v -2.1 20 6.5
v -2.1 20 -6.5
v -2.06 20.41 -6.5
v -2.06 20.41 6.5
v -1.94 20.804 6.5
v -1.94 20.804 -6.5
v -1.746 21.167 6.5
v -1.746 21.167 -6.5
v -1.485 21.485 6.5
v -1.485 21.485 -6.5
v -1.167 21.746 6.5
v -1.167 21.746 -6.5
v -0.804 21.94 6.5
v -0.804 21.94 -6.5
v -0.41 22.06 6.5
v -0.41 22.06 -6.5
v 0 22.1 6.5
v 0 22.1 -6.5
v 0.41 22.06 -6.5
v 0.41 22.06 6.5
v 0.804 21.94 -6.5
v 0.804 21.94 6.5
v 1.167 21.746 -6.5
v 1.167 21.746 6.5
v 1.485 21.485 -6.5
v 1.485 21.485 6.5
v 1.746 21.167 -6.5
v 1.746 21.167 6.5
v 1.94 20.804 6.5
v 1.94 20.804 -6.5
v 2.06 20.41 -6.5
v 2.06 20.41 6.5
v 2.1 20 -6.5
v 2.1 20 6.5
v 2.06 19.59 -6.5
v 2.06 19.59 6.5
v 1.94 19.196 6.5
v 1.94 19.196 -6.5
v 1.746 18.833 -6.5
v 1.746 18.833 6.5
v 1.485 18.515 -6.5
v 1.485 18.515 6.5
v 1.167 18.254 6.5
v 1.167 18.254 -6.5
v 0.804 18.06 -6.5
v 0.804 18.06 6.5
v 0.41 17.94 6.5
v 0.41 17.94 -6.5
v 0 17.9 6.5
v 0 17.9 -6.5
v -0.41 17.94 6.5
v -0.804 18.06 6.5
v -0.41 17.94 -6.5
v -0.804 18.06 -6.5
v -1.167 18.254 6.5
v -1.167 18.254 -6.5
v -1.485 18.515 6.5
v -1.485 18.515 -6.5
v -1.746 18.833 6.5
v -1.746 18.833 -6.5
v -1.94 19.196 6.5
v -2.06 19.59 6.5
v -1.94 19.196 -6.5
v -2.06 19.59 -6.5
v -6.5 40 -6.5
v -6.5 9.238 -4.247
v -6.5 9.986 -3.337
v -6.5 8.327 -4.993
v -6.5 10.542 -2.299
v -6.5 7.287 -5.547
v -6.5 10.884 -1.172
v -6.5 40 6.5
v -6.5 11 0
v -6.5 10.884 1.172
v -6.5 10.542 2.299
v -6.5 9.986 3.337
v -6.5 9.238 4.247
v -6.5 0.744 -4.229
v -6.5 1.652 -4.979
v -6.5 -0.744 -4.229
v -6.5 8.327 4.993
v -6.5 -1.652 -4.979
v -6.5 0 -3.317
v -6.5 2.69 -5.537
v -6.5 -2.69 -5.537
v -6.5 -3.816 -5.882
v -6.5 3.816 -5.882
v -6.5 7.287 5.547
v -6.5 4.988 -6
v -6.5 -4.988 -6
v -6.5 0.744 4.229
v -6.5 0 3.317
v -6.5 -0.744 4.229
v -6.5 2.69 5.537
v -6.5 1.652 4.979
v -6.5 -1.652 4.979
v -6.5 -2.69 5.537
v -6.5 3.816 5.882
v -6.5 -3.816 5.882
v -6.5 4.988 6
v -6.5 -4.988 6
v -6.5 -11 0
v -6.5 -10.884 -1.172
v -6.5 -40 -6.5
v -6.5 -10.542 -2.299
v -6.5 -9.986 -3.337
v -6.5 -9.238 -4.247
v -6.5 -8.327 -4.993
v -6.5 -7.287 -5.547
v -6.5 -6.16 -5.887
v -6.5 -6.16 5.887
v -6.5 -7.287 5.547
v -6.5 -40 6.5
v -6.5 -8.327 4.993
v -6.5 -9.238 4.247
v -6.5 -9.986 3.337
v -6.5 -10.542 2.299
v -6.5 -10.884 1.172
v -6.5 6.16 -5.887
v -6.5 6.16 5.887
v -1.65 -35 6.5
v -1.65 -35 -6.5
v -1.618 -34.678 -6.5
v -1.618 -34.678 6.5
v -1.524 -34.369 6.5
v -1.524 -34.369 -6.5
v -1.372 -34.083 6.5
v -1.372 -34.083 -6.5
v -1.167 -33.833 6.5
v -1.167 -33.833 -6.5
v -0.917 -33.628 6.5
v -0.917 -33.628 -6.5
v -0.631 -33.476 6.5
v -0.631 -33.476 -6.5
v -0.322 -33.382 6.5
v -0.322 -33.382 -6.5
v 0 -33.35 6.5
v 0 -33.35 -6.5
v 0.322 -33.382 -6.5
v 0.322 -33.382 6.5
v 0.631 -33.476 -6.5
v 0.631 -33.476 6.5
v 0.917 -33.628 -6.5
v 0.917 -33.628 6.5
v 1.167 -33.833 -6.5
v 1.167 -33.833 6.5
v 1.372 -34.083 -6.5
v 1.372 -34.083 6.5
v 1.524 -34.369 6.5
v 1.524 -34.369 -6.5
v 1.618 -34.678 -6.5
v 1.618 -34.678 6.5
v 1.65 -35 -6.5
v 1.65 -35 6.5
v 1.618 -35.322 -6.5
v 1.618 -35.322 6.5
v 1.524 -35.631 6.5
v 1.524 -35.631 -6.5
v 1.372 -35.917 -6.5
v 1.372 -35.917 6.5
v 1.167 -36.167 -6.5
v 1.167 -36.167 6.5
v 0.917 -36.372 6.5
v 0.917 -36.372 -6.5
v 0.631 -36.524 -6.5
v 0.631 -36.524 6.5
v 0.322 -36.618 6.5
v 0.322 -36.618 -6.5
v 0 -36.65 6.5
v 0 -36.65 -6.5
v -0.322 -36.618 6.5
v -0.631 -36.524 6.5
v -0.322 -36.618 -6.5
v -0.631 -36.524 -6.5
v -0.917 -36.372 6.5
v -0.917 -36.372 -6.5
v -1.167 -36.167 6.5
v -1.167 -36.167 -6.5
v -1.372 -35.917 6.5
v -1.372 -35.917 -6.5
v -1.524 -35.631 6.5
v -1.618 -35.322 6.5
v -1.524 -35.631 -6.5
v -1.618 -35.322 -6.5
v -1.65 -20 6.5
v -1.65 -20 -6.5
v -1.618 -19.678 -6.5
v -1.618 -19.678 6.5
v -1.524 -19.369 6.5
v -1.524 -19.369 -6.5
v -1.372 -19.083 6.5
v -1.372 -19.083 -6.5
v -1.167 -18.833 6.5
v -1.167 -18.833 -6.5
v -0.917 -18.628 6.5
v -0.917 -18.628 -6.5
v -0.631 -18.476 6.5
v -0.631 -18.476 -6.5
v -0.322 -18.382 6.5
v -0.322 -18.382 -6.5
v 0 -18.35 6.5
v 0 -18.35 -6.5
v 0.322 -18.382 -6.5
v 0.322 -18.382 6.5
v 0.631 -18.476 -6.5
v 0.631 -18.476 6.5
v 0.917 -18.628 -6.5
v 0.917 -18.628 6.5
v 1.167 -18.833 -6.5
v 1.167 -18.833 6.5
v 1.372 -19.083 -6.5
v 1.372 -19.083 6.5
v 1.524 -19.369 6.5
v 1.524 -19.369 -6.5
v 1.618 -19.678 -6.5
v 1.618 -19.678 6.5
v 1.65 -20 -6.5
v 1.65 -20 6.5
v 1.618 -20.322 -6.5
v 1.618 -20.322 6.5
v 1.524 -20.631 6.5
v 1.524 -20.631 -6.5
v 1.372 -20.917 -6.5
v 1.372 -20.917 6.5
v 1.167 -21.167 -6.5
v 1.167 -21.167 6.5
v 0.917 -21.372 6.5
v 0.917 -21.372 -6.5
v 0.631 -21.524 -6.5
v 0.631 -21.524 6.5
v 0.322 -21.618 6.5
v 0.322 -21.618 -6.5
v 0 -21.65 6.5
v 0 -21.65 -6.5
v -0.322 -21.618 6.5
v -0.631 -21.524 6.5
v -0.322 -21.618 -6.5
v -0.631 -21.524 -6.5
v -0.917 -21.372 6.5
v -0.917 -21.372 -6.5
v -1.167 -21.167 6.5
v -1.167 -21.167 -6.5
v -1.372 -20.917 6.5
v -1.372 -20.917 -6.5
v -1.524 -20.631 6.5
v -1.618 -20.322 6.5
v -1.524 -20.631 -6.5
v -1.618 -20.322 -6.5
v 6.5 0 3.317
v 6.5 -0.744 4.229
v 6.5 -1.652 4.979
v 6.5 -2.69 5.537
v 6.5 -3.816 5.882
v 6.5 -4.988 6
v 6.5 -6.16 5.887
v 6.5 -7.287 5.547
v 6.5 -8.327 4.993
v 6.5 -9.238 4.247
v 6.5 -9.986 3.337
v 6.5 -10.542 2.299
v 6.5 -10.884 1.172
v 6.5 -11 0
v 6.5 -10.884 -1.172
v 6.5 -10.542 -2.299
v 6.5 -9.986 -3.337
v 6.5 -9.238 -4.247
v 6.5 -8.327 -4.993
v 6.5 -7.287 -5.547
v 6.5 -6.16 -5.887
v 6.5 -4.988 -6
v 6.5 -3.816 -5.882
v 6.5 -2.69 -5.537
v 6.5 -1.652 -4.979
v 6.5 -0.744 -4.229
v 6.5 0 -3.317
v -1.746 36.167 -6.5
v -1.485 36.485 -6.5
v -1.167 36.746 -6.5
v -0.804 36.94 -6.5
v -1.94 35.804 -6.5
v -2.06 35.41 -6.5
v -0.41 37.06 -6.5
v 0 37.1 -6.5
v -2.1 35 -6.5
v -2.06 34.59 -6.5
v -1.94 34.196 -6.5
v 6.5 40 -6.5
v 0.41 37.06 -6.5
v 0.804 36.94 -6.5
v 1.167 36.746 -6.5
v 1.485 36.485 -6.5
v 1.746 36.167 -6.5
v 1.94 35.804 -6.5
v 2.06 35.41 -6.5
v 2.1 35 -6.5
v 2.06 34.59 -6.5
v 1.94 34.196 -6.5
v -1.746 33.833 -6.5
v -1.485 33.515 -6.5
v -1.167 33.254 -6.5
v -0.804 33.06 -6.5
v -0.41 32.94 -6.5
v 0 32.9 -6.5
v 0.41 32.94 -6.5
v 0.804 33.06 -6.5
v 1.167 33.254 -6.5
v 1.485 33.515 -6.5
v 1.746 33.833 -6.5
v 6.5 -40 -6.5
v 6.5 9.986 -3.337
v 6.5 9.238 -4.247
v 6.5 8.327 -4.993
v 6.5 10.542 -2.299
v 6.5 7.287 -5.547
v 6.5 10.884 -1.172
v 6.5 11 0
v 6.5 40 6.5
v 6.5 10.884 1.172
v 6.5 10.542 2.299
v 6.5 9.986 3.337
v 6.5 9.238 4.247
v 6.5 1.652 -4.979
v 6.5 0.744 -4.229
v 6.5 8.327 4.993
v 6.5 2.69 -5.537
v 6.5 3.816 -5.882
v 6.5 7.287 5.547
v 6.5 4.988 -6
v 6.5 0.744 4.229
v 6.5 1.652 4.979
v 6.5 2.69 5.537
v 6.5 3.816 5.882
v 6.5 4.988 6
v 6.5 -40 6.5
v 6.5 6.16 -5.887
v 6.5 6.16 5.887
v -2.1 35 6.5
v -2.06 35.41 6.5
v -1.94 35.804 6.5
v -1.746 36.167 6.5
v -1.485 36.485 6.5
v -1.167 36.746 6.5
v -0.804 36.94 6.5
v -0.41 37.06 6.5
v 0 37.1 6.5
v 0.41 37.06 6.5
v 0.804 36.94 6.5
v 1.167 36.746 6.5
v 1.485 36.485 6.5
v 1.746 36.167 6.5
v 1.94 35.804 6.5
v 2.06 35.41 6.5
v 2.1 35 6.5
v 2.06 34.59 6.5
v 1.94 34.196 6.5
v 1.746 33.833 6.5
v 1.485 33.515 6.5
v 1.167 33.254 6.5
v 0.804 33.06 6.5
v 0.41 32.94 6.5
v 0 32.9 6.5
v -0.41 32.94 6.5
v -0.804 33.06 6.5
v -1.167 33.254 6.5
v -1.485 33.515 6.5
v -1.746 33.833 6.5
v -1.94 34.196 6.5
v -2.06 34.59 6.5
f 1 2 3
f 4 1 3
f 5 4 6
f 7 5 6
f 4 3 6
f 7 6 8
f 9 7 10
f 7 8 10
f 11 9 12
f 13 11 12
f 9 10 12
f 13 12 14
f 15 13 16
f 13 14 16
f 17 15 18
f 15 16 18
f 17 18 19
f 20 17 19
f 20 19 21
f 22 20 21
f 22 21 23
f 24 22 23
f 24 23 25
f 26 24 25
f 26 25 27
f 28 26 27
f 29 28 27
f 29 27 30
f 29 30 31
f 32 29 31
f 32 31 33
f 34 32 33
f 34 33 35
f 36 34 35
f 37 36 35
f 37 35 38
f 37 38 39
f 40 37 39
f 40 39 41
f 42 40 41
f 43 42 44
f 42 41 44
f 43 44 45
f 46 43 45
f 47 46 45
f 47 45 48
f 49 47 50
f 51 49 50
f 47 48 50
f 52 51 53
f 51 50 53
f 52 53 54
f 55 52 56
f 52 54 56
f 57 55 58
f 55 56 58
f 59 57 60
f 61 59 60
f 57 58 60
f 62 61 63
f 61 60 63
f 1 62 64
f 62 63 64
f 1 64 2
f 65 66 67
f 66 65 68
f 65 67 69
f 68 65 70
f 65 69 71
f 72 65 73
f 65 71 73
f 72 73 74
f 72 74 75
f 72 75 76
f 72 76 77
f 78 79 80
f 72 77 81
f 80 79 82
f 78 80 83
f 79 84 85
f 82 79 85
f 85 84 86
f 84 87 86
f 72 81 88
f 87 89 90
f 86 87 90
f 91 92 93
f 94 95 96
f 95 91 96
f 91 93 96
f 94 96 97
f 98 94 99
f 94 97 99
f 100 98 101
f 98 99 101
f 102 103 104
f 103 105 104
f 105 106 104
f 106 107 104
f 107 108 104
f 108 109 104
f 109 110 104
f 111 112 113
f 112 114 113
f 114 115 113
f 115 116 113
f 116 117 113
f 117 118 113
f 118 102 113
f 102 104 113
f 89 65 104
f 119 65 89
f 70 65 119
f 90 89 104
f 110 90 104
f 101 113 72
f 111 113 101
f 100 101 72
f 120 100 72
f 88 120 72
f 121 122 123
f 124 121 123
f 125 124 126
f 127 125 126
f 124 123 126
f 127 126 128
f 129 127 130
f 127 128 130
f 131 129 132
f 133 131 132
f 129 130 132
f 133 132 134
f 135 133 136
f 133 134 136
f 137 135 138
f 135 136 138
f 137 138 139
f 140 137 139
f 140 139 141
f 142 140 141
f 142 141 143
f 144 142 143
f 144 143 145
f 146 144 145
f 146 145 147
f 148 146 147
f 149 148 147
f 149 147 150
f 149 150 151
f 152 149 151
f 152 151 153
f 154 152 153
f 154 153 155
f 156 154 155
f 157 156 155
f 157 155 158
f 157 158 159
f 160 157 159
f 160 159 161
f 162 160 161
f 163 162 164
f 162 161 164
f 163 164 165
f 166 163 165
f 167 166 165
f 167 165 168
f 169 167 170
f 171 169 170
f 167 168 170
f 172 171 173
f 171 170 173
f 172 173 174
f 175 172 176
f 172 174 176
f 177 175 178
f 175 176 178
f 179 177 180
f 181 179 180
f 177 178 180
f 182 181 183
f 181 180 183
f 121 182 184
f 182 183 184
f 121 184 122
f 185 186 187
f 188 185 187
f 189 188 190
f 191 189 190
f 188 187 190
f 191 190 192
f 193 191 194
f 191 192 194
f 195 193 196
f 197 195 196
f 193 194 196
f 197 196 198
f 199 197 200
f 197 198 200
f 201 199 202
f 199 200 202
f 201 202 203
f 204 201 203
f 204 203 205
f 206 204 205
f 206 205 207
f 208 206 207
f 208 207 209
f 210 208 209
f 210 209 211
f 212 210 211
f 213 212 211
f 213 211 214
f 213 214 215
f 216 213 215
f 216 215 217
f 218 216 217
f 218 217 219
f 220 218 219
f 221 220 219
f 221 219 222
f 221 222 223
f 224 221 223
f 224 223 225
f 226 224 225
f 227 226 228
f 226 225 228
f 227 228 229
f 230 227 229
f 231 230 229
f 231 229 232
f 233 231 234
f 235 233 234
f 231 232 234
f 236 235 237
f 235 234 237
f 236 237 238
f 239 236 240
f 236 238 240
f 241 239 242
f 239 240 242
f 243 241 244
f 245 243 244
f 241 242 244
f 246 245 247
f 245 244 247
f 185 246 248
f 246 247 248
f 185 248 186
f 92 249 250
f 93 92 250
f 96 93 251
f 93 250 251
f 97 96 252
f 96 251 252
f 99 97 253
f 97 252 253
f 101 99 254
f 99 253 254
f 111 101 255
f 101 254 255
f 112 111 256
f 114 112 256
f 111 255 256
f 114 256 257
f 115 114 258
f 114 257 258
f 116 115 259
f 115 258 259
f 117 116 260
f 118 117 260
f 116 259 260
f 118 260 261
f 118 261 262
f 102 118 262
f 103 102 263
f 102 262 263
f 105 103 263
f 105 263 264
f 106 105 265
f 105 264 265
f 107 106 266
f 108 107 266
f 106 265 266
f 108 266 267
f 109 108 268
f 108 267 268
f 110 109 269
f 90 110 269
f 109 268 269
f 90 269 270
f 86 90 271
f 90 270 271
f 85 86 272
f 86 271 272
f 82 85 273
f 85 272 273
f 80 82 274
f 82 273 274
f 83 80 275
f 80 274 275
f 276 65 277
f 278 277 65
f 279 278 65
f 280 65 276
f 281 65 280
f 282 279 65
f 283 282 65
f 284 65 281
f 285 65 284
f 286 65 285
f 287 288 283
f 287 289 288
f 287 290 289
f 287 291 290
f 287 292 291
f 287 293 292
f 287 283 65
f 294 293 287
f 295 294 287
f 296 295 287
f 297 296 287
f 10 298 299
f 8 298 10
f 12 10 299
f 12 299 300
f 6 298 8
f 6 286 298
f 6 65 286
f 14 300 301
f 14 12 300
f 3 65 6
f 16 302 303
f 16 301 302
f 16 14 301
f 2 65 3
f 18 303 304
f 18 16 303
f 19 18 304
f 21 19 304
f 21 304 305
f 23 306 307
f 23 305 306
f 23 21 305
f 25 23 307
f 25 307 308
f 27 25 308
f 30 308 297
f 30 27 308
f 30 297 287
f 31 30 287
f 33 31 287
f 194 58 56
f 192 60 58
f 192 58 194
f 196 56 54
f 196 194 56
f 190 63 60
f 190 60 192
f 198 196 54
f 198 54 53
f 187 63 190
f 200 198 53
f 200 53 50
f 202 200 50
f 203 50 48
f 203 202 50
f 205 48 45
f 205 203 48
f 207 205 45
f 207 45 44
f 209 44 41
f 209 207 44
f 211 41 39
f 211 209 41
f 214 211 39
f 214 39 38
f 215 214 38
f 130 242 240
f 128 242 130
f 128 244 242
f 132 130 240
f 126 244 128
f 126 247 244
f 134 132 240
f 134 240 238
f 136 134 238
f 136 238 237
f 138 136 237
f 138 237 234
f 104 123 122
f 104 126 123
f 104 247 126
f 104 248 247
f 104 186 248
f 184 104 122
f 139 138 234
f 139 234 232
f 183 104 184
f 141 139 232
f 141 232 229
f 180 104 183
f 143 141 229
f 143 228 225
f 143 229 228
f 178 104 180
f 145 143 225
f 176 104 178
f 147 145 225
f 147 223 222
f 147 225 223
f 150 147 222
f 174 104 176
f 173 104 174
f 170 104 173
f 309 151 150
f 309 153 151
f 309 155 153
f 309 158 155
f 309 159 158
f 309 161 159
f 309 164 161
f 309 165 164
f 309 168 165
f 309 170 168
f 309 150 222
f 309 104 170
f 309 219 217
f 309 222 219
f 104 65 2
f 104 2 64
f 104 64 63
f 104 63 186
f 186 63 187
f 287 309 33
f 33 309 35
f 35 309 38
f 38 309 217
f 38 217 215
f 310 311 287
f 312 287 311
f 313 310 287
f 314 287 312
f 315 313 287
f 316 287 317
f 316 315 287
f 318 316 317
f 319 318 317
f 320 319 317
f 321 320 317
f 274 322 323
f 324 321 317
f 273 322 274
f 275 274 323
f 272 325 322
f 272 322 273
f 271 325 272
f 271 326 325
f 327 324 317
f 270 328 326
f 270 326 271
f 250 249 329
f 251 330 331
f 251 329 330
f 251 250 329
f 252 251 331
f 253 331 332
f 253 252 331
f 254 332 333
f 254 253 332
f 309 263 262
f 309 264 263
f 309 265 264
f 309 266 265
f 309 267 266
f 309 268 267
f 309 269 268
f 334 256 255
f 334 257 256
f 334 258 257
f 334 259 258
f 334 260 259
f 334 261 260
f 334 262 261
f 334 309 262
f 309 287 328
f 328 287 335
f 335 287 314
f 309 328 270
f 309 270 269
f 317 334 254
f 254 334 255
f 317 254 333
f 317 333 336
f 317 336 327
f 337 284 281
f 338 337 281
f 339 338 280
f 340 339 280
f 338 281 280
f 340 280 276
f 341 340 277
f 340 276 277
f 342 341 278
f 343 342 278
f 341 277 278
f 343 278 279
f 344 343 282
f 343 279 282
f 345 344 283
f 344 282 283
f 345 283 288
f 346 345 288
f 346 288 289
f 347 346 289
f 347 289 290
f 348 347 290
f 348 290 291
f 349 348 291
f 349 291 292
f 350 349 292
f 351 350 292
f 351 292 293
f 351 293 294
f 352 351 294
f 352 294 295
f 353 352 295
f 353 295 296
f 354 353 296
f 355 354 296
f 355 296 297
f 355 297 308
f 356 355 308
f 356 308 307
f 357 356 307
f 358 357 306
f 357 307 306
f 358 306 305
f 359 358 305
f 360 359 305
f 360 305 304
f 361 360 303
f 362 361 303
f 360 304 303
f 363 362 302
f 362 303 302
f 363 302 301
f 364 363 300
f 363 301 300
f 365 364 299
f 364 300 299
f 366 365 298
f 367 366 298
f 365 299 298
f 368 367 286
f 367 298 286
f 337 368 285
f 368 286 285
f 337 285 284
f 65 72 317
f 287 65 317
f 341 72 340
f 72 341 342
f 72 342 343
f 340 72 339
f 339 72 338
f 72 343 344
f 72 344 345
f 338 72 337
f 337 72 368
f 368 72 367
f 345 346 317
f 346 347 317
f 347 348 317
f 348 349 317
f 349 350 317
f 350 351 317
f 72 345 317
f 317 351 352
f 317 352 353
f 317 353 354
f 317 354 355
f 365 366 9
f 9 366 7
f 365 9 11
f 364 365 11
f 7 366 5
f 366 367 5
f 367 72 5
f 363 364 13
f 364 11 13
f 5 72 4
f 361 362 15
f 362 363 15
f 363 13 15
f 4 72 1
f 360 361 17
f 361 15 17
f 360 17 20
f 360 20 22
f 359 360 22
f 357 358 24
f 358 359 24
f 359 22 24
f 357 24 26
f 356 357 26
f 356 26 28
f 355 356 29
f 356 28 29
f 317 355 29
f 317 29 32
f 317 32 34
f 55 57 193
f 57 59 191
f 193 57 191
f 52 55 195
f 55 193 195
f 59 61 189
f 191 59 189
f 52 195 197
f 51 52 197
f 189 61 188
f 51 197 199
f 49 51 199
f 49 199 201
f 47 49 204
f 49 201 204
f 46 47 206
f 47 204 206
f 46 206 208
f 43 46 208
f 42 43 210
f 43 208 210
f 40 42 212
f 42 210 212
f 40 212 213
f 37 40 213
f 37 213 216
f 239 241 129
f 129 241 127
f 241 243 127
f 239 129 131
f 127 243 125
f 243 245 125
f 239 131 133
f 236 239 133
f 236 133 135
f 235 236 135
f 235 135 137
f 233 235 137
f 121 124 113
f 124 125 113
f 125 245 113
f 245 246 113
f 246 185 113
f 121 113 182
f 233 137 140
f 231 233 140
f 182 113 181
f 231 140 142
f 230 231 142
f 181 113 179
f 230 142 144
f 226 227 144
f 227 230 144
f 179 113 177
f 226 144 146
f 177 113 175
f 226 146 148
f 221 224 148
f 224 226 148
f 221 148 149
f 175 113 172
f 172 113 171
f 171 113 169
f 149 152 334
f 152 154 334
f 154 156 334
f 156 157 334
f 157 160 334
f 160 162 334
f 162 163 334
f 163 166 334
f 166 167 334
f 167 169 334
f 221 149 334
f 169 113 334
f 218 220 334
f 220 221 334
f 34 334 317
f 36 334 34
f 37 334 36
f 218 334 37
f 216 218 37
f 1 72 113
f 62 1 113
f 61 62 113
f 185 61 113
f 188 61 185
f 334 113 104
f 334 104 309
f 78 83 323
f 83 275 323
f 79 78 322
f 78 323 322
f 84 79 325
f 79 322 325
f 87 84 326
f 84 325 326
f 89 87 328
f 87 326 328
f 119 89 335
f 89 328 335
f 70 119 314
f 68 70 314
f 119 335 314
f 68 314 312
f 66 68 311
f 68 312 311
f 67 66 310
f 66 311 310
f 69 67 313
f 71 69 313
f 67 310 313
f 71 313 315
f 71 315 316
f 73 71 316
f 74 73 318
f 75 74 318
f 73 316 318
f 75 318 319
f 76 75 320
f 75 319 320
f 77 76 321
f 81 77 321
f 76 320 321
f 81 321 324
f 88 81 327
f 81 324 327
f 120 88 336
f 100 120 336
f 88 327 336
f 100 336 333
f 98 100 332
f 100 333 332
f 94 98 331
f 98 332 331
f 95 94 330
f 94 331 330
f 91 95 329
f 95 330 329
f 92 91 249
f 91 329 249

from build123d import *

# Parameters (mm, degrees)
F0_W     = 13
F0_H     = 13
F1_DEPTH = 40
F3_DEPTH = 6.5
F5_D     = 3.3
F6_D     = 4.2


with BuildPart() as f1:
    # F0 (on Front) → F1 (new body, symmetric)
    with BuildSketch(Plane.XZ):
        Rectangle(F0_W, F0_H)
    extrude(amount=F1_DEPTH, both=True)

    # F2 (on Right) → F3 (cut, symmetric)
    with BuildSketch(Plane.YZ):
        with BuildLine():
            ThreePointArc((0, -3.3166247904), (11, 0), (0, 3.3166247904))
            ThreePointArc((0, 3.3166247904), (-11, 0), (0, -3.3166247904))
        make_face()
    extrude(amount=F3_DEPTH, both=True, mode=Mode.SUBTRACT)

    # F5 (through all)
    with Locations(Plane.XY.offset(6.5)):
        with Locations((0, -35), (0, -20)):
            Hole(F5_D / 2)

    # F6 (through all)
    with Locations(Plane.XY.offset(6.5)):
        with Locations((0, 20), (0, 35)):
            Hole(F6_D / 2)


solid = f1.part
